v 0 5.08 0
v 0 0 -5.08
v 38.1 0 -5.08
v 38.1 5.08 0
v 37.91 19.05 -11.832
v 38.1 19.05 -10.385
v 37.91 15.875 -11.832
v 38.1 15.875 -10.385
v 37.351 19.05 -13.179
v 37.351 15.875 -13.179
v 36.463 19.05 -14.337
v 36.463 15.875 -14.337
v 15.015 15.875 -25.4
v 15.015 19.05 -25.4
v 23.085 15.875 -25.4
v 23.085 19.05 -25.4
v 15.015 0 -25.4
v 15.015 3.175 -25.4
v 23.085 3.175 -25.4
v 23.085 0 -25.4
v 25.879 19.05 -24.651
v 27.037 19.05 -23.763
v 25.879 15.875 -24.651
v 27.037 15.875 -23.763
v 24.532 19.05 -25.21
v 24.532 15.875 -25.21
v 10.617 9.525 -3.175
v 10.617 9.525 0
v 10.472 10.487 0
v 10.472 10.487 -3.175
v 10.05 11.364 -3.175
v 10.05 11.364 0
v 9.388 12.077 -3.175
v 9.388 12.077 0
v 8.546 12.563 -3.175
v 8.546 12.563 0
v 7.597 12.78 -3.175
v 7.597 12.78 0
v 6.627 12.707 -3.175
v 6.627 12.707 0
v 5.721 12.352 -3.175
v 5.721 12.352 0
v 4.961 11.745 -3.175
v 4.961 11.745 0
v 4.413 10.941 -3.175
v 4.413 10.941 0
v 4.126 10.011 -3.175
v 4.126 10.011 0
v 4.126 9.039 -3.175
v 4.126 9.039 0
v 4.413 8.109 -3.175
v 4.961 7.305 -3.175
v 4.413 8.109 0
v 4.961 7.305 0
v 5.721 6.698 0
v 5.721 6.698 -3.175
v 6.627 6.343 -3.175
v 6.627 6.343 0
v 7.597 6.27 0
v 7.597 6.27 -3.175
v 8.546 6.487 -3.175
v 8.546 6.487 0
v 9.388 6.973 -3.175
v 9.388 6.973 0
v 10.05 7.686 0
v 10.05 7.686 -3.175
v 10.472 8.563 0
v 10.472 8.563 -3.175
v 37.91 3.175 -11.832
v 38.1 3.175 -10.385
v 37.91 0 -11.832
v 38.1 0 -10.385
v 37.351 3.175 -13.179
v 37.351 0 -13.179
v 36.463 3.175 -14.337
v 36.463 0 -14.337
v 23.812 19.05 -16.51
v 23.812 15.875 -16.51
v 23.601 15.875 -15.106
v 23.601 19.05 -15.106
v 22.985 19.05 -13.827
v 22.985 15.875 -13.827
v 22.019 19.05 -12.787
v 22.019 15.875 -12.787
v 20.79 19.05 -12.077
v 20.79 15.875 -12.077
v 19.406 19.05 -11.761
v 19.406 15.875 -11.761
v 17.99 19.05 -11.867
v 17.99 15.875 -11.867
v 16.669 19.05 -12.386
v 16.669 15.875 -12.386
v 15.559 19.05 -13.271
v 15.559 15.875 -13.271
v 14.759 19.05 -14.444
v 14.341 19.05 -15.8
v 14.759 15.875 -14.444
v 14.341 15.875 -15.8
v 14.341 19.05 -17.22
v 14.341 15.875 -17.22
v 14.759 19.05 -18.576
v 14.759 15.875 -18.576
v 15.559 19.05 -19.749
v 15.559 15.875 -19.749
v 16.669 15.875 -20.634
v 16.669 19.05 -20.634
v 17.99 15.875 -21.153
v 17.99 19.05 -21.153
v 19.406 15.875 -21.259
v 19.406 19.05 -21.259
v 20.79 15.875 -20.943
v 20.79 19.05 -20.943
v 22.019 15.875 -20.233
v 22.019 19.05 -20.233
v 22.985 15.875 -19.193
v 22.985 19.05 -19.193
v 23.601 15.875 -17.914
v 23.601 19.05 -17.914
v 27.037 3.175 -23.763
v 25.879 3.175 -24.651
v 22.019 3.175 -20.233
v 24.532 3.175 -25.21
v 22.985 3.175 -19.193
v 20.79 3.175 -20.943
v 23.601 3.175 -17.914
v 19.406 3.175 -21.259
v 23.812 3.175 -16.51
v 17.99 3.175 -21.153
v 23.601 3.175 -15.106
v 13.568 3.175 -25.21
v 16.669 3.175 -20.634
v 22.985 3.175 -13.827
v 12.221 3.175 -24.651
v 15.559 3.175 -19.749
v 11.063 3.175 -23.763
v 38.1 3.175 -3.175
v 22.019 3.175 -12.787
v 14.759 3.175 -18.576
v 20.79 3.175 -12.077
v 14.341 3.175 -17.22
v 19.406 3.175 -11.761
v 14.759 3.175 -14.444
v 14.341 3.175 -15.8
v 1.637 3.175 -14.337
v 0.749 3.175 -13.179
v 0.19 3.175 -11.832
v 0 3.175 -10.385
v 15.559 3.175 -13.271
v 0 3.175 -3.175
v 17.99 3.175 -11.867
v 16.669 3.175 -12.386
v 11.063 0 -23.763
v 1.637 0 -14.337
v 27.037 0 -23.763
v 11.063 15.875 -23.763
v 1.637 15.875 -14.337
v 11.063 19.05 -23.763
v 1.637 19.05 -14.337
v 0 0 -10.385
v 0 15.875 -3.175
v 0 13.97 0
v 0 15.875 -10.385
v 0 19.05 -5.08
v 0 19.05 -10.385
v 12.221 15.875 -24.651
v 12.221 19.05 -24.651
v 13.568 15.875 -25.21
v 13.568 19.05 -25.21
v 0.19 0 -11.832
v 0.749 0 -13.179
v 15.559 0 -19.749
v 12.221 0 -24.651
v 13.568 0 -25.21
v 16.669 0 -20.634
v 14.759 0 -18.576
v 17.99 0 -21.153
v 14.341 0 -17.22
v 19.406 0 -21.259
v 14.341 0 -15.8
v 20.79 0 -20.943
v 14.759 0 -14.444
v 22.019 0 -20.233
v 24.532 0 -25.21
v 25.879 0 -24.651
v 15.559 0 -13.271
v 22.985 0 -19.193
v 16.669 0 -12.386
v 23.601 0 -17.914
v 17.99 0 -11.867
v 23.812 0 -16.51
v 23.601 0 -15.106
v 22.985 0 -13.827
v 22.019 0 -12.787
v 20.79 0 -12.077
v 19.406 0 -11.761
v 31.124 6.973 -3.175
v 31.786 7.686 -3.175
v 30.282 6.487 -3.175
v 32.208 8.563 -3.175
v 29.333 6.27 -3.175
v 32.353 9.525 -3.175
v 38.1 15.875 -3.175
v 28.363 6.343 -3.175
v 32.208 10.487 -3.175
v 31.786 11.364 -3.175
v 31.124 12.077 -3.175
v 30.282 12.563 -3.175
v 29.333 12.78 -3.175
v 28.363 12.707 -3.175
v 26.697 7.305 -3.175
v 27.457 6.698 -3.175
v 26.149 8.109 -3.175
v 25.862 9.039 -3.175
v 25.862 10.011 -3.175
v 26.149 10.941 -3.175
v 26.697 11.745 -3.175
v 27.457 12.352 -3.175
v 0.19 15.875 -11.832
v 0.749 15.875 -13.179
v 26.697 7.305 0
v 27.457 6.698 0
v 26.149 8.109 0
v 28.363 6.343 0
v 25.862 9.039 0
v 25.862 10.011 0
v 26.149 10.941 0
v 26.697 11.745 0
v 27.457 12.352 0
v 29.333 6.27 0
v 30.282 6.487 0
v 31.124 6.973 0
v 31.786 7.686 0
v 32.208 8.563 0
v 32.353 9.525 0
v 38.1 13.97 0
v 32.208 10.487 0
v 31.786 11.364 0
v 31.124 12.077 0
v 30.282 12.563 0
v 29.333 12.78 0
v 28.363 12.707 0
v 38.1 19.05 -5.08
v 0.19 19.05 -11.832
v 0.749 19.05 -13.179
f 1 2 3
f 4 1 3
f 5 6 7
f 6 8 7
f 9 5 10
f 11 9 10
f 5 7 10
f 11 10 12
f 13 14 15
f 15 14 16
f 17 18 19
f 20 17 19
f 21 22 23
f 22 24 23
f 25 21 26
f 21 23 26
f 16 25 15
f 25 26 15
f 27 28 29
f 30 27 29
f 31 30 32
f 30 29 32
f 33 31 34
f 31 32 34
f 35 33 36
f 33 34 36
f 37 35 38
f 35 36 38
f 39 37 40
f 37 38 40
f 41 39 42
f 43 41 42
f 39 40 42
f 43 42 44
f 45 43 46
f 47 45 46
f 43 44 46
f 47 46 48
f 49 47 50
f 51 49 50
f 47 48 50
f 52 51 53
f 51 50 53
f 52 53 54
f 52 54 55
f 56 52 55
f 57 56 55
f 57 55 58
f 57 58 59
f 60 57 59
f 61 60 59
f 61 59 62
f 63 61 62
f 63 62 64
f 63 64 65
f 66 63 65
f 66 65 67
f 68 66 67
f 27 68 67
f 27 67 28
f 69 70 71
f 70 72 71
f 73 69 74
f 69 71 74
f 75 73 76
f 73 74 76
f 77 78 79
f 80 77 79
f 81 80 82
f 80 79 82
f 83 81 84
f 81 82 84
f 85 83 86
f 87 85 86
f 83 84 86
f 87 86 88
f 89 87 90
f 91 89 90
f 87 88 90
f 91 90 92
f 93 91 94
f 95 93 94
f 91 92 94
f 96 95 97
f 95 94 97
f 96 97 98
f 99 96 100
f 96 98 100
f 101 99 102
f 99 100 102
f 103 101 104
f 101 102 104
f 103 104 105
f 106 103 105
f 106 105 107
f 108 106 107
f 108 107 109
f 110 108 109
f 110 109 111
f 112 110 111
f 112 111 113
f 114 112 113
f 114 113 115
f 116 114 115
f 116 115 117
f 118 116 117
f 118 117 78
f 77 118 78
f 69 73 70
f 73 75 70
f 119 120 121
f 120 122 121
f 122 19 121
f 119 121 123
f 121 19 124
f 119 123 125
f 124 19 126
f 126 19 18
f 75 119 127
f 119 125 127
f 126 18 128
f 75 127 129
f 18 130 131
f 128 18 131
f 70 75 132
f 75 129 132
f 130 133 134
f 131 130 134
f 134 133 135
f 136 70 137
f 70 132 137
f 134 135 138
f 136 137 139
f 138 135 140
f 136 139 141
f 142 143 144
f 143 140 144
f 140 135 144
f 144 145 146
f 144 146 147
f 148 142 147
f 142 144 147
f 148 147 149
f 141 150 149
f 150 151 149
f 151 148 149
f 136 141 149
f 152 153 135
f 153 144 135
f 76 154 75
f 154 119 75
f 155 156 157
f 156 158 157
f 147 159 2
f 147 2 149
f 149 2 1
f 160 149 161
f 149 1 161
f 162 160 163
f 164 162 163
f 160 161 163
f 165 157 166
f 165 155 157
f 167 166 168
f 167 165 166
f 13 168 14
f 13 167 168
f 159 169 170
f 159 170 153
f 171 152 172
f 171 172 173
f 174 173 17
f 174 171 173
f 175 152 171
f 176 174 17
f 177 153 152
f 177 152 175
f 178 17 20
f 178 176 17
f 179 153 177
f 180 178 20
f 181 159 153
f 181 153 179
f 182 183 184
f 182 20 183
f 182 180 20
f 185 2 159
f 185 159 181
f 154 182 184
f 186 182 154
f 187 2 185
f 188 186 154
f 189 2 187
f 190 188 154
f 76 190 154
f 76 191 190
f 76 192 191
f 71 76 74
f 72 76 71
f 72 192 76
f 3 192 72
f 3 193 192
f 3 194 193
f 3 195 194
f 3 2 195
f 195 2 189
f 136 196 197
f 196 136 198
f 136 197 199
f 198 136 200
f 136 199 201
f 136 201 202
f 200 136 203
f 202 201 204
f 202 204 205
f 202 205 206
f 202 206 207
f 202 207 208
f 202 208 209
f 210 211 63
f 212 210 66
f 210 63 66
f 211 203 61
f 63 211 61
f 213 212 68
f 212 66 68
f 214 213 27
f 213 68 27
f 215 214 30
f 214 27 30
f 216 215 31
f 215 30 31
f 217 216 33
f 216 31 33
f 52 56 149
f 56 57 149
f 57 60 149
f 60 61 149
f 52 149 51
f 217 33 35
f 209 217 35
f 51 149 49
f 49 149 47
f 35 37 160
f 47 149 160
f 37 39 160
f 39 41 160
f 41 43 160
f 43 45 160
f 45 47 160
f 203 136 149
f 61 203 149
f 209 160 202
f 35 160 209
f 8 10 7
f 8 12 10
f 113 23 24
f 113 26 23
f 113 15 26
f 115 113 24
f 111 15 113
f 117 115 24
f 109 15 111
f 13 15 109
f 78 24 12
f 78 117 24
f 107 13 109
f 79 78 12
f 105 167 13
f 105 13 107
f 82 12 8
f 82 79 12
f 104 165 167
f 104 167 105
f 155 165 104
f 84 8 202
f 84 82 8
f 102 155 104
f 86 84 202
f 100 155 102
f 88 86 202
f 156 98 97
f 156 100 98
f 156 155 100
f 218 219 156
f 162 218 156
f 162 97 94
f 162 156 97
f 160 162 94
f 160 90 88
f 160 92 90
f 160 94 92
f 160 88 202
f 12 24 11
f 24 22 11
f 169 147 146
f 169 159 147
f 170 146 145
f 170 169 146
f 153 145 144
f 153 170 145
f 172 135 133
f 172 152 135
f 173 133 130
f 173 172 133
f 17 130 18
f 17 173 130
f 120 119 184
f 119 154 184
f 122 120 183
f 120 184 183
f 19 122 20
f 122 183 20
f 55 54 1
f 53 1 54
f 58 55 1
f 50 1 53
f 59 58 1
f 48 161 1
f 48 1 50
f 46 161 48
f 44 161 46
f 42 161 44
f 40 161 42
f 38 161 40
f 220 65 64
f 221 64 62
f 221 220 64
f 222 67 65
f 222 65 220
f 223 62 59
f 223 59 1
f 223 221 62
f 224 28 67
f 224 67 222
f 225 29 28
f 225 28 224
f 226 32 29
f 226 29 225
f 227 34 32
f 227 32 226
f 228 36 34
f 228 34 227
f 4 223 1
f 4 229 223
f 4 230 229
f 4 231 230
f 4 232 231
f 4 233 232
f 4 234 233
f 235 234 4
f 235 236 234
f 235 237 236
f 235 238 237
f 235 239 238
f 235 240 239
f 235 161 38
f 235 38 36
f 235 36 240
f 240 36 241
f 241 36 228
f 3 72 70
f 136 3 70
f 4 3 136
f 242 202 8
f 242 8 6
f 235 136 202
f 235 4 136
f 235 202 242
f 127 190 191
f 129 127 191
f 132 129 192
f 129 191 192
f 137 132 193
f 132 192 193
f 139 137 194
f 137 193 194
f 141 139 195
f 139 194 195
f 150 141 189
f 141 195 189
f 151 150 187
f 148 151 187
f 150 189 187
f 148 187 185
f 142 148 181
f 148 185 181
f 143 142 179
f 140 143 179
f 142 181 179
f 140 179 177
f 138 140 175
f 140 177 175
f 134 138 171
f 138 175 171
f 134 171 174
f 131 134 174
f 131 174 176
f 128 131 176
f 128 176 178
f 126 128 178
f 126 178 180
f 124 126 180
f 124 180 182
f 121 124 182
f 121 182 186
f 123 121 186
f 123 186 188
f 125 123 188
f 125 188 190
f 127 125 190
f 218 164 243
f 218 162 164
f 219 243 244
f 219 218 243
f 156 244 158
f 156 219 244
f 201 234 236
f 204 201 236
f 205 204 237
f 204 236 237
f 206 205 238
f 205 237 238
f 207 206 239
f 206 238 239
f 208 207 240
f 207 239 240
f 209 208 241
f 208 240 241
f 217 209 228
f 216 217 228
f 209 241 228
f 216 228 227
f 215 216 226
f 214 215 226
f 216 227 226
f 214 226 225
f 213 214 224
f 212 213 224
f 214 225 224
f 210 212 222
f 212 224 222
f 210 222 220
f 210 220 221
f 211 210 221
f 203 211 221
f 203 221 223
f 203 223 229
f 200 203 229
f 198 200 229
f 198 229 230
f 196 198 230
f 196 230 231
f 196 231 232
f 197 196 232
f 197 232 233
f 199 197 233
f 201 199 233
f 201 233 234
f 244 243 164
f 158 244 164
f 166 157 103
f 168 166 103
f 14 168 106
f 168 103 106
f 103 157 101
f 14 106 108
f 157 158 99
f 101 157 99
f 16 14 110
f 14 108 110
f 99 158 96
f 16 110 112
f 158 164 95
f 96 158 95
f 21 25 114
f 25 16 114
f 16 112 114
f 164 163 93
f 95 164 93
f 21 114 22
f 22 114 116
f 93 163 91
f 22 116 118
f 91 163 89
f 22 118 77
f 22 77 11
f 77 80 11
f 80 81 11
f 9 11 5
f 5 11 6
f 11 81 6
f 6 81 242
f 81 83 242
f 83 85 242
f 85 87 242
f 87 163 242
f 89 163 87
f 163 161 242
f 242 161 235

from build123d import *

# Parameters (mm, degrees)
F0_W        = 38.1
F0_H        = 19.05
F1_DEPTH    = 25.4
F2_R        = 3.2639
F3_DEPTH    = 25.4
F4_R        = 4.7625
F5_DEPTH    = 25.4
F6_T1_DEPTH = 84.3707478943
F7_W        = 12.7
F7_H        = 22.225
F8_DEPTH    = 38.1
F9_R        = 5.588
F10_SIZE    = 5.08


# Not quite as in the source:
# - a fillet or chamfer that OpenCascade refuses, or shapes differently, is made with other operations: its cross-section is extruded or revolved along the edge and cut away or added


with BuildPart() as f1:
    # F0 (on Top) → F1 (new body)
    with BuildSketch(Plane.XY):
        with Locations((19.05, 9.525)):
            Rectangle(F0_W, F0_H)
    extrude(amount=-F1_DEPTH)

    # F2 (on face) → F3 (cut)
    with BuildSketch(Plane.XY):
        with Locations((7.3534409022, 9.525)):
            Circle(F2_R)
        with Locations((29.0893973289, 9.525)):
            Circle(F2_R)
    extrude(amount=-F3_DEPTH, mode=Mode.SUBTRACT)

    # F4 (on face) → F5 (cut)
    with BuildSketch(Plane.XZ):
        with Locations((19.05, -16.51)):
            Circle(F4_R)
    extrude(amount=-F5_DEPTH, mode=Mode.SUBTRACT)

    # F6: chamfer of 12.7 on 2 edges, made by hand

    # F6_s2 → F6_t1 (cut)
    with BuildSketch(Plane.XZ.offset(-51.7103739472)):
        Polygon((25.4, -25.4), (38.1, -12.7), (38.1, -25.4), align=None)
        Polygon((0, -12.7), (12.7, -25.4), (0, -25.4), align=None)
    extrude(amount=F6_T1_DEPTH, mode=Mode.SUBTRACT)

    # F7 (on Right) → F8 (cut)
    with BuildSketch(Plane.YZ):
        with Locations((9.525, -14.2875)):
            Rectangle(F7_W, F7_H)
    extrude(amount=F8_DEPTH, mode=Mode.SUBTRACT)

    # F9
    f9_edges = [f1.edges().sort_by_distance(p)[0] for p in [
        (0, 17.4625, -12.7),
        (0, 1.5875, -12.7),
        (12.7, 17.4625, -25.4),
        (12.7, 1.5875, -25.4),
        (25.4, 1.5875, -25.4),
        (25.4, 17.4625, -25.4),
        (38.1, 17.4625, -12.7),
        (38.1, 1.5875, -12.7),
    ]]
    fillet(f9_edges, radius=F9_R)

    # F10
    f10_edges = [f1.edges().sort_by_distance(p)[0] for p in [
        (19.05, 19.05, 0),
        (19.05, 0, 0),
    ]]
    chamfer(f10_edges, length=F10_SIZE)


solid = f1.part
